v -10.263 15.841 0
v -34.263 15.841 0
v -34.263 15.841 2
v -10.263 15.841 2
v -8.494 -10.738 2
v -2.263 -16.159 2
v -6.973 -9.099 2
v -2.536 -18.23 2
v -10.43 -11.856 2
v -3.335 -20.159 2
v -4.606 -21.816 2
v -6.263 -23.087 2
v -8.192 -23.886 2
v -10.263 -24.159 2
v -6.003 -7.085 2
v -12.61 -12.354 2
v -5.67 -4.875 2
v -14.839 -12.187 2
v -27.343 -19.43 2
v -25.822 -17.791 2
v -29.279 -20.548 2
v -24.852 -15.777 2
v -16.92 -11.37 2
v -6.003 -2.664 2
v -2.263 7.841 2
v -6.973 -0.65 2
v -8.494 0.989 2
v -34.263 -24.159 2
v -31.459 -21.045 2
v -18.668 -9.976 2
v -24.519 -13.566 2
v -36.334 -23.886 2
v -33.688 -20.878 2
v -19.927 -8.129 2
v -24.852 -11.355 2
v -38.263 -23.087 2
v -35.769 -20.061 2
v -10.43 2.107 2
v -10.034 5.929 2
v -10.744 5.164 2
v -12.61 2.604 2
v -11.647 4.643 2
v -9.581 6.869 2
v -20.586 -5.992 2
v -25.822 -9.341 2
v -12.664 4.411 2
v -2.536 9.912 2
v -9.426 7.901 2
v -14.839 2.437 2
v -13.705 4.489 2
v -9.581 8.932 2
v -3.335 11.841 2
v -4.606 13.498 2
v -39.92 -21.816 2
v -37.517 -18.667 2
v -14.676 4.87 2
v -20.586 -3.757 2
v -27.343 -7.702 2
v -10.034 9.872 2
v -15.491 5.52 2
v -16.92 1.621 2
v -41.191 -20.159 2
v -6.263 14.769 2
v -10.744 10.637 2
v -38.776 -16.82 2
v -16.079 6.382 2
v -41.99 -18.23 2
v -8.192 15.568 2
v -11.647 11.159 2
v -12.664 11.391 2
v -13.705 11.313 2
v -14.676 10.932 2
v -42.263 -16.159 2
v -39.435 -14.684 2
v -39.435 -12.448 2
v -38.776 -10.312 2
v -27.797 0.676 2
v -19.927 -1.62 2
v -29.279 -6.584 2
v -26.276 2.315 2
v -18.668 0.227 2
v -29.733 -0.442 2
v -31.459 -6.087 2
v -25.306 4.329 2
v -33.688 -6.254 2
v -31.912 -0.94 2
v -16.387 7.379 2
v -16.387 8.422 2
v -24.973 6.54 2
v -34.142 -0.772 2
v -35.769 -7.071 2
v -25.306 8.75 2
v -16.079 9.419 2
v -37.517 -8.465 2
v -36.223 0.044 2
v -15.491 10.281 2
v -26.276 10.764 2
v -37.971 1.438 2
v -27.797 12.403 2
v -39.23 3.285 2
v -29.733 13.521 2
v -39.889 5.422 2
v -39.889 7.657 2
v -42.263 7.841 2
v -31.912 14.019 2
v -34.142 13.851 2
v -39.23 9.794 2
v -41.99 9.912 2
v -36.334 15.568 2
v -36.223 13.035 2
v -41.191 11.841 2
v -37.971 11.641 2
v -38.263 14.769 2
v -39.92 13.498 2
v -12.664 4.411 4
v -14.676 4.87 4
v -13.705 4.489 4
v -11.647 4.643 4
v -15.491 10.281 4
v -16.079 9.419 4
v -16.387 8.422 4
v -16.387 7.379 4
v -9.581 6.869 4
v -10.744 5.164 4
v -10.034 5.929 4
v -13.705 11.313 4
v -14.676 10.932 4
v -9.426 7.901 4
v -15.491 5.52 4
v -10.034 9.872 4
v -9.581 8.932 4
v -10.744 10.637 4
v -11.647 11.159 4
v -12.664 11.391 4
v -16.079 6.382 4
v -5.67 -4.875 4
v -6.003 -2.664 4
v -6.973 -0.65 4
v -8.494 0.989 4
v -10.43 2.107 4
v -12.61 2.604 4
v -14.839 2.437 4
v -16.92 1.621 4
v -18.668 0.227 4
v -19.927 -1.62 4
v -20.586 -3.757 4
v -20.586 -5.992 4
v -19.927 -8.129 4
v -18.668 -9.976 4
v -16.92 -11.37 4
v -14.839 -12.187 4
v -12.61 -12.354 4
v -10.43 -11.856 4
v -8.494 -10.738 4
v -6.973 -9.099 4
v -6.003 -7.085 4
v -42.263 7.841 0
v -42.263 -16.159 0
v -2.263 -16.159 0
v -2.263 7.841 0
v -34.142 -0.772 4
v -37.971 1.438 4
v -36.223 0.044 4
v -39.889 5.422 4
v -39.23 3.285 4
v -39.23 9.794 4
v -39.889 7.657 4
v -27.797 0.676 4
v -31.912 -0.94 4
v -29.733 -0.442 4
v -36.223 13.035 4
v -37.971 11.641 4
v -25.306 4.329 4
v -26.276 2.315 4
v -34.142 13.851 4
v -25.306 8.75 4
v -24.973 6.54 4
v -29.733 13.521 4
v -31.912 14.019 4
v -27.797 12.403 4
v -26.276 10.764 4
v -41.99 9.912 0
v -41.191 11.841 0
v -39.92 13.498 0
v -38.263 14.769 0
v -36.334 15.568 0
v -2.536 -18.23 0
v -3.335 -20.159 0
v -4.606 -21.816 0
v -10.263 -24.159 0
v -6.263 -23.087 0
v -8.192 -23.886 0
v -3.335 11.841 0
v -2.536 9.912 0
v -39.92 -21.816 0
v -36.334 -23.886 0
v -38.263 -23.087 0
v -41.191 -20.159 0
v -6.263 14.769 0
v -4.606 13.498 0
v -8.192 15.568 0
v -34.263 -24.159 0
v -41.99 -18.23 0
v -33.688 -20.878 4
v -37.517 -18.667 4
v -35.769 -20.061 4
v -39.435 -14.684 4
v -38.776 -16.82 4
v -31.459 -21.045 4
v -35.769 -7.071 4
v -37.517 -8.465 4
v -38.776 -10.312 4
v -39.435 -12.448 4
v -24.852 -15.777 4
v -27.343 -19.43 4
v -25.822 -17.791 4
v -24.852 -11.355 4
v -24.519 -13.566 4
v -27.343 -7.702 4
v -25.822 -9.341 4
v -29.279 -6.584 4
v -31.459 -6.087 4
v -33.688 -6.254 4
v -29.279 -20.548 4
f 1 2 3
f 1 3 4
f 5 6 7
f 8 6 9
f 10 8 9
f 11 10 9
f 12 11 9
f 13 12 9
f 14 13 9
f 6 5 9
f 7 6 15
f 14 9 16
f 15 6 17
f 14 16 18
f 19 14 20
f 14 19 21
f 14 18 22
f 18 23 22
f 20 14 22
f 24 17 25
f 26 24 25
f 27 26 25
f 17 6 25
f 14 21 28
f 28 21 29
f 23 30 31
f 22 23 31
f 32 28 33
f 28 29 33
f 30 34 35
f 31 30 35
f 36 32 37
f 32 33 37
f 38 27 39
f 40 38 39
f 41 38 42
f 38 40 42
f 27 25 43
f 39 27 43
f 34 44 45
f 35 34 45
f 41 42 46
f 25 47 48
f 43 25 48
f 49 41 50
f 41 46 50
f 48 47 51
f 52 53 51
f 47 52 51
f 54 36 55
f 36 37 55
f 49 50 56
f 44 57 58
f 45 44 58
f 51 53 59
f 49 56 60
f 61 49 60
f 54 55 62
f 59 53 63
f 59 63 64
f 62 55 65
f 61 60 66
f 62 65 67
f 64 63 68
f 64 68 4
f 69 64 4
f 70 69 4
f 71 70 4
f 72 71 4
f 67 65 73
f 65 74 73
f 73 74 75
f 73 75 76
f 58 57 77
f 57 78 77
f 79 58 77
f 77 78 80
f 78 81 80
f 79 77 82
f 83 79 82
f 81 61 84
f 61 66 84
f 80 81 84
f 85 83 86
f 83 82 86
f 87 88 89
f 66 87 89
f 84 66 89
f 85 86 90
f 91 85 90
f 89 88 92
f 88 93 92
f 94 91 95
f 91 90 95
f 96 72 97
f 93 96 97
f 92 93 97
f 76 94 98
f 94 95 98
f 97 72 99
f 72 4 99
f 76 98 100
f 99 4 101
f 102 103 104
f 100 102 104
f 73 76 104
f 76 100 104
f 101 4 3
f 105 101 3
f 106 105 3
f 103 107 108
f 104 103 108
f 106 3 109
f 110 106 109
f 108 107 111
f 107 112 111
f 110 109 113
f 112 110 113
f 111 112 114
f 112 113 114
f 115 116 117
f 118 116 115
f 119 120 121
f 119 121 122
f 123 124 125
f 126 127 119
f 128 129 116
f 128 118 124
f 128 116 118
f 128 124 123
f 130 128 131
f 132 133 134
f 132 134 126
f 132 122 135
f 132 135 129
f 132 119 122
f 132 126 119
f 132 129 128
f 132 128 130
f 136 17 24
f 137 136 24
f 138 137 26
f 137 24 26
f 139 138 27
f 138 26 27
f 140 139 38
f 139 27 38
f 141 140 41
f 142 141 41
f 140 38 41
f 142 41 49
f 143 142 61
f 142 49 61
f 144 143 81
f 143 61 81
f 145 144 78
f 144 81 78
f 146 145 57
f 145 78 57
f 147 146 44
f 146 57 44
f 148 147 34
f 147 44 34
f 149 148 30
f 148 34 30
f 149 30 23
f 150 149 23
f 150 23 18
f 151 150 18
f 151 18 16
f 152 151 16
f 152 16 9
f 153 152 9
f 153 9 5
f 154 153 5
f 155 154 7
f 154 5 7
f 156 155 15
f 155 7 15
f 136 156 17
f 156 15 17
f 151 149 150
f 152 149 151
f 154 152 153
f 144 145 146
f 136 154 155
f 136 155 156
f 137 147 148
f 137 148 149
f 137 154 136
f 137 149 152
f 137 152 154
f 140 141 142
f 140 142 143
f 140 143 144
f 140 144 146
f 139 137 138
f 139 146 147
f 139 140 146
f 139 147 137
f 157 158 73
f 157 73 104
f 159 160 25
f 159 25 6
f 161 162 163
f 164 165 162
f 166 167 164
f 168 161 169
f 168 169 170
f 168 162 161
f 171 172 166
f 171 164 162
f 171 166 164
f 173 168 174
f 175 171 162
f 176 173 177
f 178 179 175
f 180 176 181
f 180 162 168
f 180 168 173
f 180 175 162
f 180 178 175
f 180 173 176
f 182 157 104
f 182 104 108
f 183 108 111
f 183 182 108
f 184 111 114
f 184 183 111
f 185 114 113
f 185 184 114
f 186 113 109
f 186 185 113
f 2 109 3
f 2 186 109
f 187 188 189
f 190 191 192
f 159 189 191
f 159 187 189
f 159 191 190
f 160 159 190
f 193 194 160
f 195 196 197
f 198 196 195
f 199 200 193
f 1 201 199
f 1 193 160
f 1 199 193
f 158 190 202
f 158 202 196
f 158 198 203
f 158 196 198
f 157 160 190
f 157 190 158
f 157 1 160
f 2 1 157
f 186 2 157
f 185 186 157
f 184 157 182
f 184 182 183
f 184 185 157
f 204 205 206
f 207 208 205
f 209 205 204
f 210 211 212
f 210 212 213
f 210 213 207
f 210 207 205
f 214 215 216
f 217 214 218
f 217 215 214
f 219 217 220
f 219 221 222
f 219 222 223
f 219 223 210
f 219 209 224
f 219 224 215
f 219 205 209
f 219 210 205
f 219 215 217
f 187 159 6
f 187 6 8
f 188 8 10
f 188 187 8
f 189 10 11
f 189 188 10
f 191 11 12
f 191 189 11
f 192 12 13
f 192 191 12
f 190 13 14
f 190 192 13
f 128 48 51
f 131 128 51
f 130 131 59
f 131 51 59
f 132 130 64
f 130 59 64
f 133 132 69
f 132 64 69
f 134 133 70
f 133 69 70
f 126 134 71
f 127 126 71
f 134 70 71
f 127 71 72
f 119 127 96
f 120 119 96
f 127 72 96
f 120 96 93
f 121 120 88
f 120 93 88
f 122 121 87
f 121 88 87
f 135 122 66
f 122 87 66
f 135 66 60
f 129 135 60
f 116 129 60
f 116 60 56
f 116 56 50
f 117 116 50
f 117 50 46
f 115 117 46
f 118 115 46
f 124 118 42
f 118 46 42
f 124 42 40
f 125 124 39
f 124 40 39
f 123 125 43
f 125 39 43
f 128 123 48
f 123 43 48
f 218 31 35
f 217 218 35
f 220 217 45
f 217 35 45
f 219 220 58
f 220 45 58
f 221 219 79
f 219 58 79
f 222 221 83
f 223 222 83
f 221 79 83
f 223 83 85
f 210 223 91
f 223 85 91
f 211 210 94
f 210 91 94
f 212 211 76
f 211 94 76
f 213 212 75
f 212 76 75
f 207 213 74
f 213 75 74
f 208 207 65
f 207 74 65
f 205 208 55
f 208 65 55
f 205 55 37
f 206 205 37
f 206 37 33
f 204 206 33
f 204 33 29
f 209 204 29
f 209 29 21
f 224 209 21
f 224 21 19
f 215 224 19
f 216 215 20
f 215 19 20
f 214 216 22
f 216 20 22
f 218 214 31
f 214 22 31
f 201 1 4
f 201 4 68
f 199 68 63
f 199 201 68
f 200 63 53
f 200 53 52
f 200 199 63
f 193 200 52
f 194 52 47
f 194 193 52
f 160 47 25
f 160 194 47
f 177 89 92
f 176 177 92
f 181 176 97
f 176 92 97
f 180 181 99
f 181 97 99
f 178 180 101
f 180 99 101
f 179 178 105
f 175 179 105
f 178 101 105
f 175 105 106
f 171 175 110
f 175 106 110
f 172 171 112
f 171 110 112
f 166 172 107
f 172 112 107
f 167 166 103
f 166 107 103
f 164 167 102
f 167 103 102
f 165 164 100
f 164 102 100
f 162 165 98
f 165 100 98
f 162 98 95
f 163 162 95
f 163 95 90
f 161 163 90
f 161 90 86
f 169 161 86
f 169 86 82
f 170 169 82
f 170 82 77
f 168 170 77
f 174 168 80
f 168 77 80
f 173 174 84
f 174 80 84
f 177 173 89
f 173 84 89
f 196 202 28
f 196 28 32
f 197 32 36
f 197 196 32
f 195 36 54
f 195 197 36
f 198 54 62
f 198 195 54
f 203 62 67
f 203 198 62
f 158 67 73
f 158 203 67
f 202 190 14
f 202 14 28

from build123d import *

# Parameters (mm, degrees)
EXTRUDE_1_DEPTH = 2
SKETCH_2_R      = 7.5
SKETCH_2_R_2    = 3.5
EXTRUDE_2_DEPTH = 2


with BuildPart() as part:
    # 草图1 → 凸台-拉伸1 (new body)
    with BuildSketch(Plane.XY):
        with BuildLine():
            Line((-34.262996942, 15.840978593), (-10.262996942, 15.840978593))
            ThreePointArc((-10.262996942, 15.840978593), (-4.606142692, 13.497832843), (-2.262996942, 7.840978593))
            Line((-2.262996942, 7.840978593), (-2.262996942, -16.159021407))
            ThreePointArc((-2.262996942, -16.159021407), (-4.606142692, -21.815875656), (-10.262996942, -24.159021407))
            Line((-10.262996942, -24.159021407), (-34.262996942, -24.159021407))
            ThreePointArc((-34.262996942, -24.159021407), (-39.919851191, -21.815875656), (-42.262996942, -16.159021407))
            Line((-42.262996942, -16.159021407), (-42.262996942, 7.840978593))
            ThreePointArc((-42.262996942, 7.840978593), (-39.919851191, 13.497832843), (-34.262996942, 15.840978593))
        make_face()
    extrude(amount=EXTRUDE_1_DEPTH)

    # 草图2 → 凸台-拉伸2 (add)
    with BuildSketch(Plane.XY.offset(2)):
        with Locations((-32.472843906, 6.539501993)):
            Circle(SKETCH_2_R)
        with Locations((-32.01907293, -13.566042797)):
            Circle(SKETCH_2_R)
        with Locations((-13.170124689, -4.874583331)):
            Circle(SKETCH_2_R)
        with Locations((-12.925786471, 7.900814922)):
            Circle(SKETCH_2_R_2)
    extrude(amount=EXTRUDE_2_DEPTH)


solid = part.part
